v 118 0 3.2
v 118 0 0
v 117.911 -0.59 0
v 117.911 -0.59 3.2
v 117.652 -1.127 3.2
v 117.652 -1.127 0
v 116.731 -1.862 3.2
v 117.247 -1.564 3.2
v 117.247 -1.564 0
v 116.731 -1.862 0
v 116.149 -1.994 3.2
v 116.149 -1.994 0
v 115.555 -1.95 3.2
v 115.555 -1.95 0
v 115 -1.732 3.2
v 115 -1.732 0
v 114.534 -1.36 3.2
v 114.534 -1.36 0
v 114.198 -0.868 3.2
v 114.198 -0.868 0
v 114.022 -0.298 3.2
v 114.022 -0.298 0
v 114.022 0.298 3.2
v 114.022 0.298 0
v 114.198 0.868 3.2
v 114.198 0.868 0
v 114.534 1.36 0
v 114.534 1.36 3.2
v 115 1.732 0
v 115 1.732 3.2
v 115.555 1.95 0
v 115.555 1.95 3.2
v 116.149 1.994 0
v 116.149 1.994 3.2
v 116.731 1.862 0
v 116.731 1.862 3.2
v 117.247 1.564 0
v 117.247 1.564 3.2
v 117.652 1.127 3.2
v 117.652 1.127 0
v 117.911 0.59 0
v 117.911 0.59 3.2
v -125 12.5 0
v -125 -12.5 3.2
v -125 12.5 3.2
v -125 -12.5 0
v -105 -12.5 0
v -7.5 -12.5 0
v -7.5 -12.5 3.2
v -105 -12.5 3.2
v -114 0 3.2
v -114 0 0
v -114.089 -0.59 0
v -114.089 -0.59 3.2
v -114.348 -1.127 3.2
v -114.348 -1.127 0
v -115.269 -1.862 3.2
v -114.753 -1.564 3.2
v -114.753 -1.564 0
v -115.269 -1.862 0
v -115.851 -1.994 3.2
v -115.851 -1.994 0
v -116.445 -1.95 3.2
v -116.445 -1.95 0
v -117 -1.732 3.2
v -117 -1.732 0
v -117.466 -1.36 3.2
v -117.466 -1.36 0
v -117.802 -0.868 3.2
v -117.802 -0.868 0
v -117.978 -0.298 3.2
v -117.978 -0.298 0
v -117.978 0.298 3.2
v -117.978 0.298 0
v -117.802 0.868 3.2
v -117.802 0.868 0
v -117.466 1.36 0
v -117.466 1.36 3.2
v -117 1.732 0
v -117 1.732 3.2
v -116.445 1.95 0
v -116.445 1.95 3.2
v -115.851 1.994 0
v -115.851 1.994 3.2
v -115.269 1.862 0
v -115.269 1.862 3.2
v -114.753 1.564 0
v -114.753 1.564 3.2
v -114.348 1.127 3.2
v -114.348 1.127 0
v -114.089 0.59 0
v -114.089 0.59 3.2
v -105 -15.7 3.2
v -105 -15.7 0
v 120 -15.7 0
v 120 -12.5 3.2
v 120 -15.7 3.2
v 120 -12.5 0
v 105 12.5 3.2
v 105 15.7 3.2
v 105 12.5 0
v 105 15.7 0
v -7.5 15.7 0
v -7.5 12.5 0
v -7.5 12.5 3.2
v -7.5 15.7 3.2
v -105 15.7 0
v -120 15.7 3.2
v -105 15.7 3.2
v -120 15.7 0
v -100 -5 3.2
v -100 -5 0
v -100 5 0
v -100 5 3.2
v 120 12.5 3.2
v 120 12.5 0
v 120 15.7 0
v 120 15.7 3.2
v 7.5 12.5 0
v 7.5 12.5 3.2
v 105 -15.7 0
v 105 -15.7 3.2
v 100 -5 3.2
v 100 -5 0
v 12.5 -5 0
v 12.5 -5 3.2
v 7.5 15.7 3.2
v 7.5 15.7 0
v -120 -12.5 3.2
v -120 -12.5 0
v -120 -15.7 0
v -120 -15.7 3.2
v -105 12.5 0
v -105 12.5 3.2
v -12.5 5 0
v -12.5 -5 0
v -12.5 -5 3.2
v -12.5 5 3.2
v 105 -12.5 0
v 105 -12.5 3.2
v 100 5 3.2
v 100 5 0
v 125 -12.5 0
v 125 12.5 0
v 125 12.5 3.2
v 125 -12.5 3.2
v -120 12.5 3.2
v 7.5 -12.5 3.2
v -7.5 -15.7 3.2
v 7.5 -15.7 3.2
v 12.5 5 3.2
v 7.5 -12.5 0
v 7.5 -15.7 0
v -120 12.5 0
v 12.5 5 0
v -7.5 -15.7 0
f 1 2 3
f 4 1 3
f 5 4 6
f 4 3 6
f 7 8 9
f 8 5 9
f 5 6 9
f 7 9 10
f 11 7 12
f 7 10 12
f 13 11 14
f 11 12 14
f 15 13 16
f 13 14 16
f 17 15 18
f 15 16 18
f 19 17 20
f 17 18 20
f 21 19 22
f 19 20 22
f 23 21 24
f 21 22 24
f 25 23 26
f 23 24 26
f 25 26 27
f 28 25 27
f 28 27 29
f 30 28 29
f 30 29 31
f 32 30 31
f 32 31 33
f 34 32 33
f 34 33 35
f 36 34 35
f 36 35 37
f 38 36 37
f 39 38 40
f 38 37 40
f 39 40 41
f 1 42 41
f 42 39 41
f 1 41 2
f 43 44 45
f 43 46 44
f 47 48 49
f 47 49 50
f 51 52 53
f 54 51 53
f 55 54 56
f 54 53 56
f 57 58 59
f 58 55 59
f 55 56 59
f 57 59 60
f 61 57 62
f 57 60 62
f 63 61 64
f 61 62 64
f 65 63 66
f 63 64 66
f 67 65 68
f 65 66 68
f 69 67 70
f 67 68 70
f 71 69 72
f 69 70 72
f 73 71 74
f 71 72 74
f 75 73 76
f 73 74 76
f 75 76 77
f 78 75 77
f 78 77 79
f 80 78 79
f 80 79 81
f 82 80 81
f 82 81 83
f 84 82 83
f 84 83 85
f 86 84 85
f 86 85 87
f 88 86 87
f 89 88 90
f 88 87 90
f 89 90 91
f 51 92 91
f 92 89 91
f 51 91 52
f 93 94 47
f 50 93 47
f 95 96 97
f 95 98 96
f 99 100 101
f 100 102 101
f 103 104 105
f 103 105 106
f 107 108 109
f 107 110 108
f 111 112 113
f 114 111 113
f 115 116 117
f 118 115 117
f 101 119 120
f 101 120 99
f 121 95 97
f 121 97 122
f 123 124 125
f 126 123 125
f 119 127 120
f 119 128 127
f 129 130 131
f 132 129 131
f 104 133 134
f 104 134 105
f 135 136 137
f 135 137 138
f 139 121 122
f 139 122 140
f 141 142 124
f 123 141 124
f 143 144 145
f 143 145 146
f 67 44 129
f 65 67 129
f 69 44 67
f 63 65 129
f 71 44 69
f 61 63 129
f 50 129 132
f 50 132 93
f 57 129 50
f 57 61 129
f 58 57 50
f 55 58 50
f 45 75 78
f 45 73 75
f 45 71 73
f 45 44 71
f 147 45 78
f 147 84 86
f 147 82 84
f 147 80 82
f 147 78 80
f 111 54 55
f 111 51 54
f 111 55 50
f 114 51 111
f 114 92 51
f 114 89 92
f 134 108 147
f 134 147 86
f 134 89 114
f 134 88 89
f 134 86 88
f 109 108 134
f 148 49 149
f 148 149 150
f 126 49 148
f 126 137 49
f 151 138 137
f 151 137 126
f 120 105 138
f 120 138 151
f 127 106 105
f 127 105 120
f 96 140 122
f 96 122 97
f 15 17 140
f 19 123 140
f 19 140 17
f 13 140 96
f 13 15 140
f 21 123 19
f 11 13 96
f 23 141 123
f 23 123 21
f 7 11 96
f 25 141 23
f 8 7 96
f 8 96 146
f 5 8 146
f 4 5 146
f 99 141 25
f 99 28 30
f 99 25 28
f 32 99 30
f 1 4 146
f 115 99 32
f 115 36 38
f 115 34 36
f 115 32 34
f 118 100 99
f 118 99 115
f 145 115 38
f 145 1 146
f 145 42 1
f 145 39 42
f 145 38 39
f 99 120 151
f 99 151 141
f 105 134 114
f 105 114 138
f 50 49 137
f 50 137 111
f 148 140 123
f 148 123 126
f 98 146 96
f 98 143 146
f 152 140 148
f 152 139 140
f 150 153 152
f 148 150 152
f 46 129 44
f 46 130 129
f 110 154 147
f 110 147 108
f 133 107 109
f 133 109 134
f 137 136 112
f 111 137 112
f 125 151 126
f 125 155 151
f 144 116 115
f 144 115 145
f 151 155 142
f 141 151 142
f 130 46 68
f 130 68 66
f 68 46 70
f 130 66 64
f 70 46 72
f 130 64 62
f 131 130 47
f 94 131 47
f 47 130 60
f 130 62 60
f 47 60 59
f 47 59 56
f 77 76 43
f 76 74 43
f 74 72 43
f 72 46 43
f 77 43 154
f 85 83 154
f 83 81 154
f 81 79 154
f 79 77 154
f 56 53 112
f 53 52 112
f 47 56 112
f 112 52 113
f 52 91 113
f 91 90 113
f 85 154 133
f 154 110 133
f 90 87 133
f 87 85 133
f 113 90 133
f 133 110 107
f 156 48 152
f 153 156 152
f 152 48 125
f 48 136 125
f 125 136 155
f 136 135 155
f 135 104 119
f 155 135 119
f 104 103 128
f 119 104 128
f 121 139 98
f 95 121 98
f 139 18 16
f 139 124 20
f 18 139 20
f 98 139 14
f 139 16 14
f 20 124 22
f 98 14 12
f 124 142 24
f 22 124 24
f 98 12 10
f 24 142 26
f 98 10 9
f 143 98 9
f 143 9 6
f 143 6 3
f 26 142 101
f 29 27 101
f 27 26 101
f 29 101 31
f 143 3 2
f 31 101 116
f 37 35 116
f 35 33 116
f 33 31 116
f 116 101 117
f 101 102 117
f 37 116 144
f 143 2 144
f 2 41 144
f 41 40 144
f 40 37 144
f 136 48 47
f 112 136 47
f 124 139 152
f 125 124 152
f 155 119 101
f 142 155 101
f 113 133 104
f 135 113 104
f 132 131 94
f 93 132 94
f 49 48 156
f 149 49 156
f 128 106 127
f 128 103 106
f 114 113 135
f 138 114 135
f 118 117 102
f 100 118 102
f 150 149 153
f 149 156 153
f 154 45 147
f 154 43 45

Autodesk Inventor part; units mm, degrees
ref_plane "YZ Plane" through (0, 0, 0) normal (1, 0, 0) x (0, 1, 0)
ref_plane "XZ Plane" through (0, 0, 0) normal (0, 1, 0) x (-1, 0, 0)
ref_plane "XY Plane" through (0, 0, 0) normal (0, 0, 1) x (1, 0, 0)
sketch "Sketch1" plane through (0, 0, 0) normal (0, 0, 1) x (1, 0, 0)
  line L0 (-125, 12.5) -> (125, 12.5)
  line L1 (125, 12.5) -> (125, -12.5)
  line L2 (125, -12.5) -> (-125, -12.5)
  line L3 (-125, -12.5) -> (-125, 12.5)
  line L4 (-125, 12.5) -> (125, -12.5) construction
  line L5 (125, 12.5) -> (-125, -12.5) construction
  line L6 (100, -5) -> (-100, -5)
  line L7 (-100, -5) -> (-100, 5)
  line L8 (-100, 5) -> (100, 5)
  line L9 (100, 5) -> (100, -5)
  line L10 (100, -5) -> (-100, 5) construction
  line L11 (-100, -5) -> (100, 5) construction
  line L12 (-120, 12.5) -> (-120, 15.7)
  line L13 (-120, 15.7) -> (-105, 15.7)
  line L14 (-105, 15.7) -> (-105, 12.5)
  line L15 (-7.5, 12.5) -> (-7.5, 15.7)
  line L16 (-7.5, 15.7) -> (7.5, 15.7)
  line L17 (7.5, 15.7) -> (7.5, 12.5)
  line L18 (0, 0) -> (0, 12.5) construction
  line L19 (0, 0) -> (31.571, 0) construction
  line L20 (120, 12.5) -> (120, 15.7)
  line L21 (120, 15.7) -> (105, 15.7)
  line L22 (105, 15.7) -> (105, 12.5)
  line L23 (-120, -12.5) -> (-120, -15.7)
  line L24 (-120, -15.7) -> (-105, -15.7)
  line L25 (-105, -15.7) -> (-105, -12.5)
  line L26 (-7.5, -12.5) -> (-7.5, -15.7)
  line L27 (-7.5, -15.7) -> (7.5, -15.7)
  line L28 (7.5, -15.7) -> (7.5, -12.5)
  line L29 (120, -12.5) -> (120, -15.7)
  line L30 (120, -15.7) -> (105, -15.7)
  line L31 (105, -15.7) -> (105, -12.5)
  circle A0 centre (-116, 0) radius 2 projected
  circle A1 centre (-116, 0) radius 2
  circle A2 centre (116, 0) radius 2
  line L32 (-12.5, 5) -> (12.5, 5)
  line L33 (12.5, 5) -> (12.5, -5)
  line L34 (12.5, -5) -> (-12.5, -5)
  line L35 (-12.5, -5) -> (-12.5, 5)
  line L36 (-12.5, 5) -> (12.5, -5) construction
  line L37 (12.5, 5) -> (-12.5, -5) construction
  dimension "d0" = 250
  dimension "d1" = 25
  dimension "d6" = 200
  dimension "d7" = 10
  dimension "d10" = 3.2
  dimension "d11" = 15
  dimension "d12" = 5
  dimension "d13" = 3.2
  dimension "d14" = 15
  dimension "d15" = 7.5
  dimension "d18" = 25
  dimension "d19" = 10
extrude "Extrusion4" add sketch "Sketch1" along normal blind 3.2 contours L0 L1 L2 L3 | L12 L13 L14 L0 | L2 L25 L24 L23 | L15 L16 L17 L0 | L2 L28 L27 L26 | L22 L21 L20 L0 | L2 L29 L30 L31 | L6 L35 L8 L33
properties part number "Base_Carril"
